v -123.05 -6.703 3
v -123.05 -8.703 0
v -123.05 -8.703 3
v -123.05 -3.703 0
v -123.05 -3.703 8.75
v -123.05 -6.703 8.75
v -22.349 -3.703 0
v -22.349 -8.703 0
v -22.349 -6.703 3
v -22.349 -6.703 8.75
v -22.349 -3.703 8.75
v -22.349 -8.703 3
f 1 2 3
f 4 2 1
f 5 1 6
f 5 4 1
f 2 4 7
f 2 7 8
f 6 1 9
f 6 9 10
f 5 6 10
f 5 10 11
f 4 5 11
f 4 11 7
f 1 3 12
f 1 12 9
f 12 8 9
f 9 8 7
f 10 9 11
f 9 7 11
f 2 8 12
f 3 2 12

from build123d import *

# Parameters (mm, degrees)
EXTRUDE_1_DEPTH = 100.70048


with BuildPart() as part:
    # 草图2 → 凸台-拉伸1 (new body)
    with BuildSketch(Plane.ZY.offset(123.049709027)):
        Polygon((0, -3.703400415), (0, -8.703400415), (3, -8.703400415), (3, -6.703400415), (8.75, -6.703400415), (8.75, -3.703400415), align=None)
    extrude(amount=-EXTRUDE_1_DEPTH)


solid = part.part
